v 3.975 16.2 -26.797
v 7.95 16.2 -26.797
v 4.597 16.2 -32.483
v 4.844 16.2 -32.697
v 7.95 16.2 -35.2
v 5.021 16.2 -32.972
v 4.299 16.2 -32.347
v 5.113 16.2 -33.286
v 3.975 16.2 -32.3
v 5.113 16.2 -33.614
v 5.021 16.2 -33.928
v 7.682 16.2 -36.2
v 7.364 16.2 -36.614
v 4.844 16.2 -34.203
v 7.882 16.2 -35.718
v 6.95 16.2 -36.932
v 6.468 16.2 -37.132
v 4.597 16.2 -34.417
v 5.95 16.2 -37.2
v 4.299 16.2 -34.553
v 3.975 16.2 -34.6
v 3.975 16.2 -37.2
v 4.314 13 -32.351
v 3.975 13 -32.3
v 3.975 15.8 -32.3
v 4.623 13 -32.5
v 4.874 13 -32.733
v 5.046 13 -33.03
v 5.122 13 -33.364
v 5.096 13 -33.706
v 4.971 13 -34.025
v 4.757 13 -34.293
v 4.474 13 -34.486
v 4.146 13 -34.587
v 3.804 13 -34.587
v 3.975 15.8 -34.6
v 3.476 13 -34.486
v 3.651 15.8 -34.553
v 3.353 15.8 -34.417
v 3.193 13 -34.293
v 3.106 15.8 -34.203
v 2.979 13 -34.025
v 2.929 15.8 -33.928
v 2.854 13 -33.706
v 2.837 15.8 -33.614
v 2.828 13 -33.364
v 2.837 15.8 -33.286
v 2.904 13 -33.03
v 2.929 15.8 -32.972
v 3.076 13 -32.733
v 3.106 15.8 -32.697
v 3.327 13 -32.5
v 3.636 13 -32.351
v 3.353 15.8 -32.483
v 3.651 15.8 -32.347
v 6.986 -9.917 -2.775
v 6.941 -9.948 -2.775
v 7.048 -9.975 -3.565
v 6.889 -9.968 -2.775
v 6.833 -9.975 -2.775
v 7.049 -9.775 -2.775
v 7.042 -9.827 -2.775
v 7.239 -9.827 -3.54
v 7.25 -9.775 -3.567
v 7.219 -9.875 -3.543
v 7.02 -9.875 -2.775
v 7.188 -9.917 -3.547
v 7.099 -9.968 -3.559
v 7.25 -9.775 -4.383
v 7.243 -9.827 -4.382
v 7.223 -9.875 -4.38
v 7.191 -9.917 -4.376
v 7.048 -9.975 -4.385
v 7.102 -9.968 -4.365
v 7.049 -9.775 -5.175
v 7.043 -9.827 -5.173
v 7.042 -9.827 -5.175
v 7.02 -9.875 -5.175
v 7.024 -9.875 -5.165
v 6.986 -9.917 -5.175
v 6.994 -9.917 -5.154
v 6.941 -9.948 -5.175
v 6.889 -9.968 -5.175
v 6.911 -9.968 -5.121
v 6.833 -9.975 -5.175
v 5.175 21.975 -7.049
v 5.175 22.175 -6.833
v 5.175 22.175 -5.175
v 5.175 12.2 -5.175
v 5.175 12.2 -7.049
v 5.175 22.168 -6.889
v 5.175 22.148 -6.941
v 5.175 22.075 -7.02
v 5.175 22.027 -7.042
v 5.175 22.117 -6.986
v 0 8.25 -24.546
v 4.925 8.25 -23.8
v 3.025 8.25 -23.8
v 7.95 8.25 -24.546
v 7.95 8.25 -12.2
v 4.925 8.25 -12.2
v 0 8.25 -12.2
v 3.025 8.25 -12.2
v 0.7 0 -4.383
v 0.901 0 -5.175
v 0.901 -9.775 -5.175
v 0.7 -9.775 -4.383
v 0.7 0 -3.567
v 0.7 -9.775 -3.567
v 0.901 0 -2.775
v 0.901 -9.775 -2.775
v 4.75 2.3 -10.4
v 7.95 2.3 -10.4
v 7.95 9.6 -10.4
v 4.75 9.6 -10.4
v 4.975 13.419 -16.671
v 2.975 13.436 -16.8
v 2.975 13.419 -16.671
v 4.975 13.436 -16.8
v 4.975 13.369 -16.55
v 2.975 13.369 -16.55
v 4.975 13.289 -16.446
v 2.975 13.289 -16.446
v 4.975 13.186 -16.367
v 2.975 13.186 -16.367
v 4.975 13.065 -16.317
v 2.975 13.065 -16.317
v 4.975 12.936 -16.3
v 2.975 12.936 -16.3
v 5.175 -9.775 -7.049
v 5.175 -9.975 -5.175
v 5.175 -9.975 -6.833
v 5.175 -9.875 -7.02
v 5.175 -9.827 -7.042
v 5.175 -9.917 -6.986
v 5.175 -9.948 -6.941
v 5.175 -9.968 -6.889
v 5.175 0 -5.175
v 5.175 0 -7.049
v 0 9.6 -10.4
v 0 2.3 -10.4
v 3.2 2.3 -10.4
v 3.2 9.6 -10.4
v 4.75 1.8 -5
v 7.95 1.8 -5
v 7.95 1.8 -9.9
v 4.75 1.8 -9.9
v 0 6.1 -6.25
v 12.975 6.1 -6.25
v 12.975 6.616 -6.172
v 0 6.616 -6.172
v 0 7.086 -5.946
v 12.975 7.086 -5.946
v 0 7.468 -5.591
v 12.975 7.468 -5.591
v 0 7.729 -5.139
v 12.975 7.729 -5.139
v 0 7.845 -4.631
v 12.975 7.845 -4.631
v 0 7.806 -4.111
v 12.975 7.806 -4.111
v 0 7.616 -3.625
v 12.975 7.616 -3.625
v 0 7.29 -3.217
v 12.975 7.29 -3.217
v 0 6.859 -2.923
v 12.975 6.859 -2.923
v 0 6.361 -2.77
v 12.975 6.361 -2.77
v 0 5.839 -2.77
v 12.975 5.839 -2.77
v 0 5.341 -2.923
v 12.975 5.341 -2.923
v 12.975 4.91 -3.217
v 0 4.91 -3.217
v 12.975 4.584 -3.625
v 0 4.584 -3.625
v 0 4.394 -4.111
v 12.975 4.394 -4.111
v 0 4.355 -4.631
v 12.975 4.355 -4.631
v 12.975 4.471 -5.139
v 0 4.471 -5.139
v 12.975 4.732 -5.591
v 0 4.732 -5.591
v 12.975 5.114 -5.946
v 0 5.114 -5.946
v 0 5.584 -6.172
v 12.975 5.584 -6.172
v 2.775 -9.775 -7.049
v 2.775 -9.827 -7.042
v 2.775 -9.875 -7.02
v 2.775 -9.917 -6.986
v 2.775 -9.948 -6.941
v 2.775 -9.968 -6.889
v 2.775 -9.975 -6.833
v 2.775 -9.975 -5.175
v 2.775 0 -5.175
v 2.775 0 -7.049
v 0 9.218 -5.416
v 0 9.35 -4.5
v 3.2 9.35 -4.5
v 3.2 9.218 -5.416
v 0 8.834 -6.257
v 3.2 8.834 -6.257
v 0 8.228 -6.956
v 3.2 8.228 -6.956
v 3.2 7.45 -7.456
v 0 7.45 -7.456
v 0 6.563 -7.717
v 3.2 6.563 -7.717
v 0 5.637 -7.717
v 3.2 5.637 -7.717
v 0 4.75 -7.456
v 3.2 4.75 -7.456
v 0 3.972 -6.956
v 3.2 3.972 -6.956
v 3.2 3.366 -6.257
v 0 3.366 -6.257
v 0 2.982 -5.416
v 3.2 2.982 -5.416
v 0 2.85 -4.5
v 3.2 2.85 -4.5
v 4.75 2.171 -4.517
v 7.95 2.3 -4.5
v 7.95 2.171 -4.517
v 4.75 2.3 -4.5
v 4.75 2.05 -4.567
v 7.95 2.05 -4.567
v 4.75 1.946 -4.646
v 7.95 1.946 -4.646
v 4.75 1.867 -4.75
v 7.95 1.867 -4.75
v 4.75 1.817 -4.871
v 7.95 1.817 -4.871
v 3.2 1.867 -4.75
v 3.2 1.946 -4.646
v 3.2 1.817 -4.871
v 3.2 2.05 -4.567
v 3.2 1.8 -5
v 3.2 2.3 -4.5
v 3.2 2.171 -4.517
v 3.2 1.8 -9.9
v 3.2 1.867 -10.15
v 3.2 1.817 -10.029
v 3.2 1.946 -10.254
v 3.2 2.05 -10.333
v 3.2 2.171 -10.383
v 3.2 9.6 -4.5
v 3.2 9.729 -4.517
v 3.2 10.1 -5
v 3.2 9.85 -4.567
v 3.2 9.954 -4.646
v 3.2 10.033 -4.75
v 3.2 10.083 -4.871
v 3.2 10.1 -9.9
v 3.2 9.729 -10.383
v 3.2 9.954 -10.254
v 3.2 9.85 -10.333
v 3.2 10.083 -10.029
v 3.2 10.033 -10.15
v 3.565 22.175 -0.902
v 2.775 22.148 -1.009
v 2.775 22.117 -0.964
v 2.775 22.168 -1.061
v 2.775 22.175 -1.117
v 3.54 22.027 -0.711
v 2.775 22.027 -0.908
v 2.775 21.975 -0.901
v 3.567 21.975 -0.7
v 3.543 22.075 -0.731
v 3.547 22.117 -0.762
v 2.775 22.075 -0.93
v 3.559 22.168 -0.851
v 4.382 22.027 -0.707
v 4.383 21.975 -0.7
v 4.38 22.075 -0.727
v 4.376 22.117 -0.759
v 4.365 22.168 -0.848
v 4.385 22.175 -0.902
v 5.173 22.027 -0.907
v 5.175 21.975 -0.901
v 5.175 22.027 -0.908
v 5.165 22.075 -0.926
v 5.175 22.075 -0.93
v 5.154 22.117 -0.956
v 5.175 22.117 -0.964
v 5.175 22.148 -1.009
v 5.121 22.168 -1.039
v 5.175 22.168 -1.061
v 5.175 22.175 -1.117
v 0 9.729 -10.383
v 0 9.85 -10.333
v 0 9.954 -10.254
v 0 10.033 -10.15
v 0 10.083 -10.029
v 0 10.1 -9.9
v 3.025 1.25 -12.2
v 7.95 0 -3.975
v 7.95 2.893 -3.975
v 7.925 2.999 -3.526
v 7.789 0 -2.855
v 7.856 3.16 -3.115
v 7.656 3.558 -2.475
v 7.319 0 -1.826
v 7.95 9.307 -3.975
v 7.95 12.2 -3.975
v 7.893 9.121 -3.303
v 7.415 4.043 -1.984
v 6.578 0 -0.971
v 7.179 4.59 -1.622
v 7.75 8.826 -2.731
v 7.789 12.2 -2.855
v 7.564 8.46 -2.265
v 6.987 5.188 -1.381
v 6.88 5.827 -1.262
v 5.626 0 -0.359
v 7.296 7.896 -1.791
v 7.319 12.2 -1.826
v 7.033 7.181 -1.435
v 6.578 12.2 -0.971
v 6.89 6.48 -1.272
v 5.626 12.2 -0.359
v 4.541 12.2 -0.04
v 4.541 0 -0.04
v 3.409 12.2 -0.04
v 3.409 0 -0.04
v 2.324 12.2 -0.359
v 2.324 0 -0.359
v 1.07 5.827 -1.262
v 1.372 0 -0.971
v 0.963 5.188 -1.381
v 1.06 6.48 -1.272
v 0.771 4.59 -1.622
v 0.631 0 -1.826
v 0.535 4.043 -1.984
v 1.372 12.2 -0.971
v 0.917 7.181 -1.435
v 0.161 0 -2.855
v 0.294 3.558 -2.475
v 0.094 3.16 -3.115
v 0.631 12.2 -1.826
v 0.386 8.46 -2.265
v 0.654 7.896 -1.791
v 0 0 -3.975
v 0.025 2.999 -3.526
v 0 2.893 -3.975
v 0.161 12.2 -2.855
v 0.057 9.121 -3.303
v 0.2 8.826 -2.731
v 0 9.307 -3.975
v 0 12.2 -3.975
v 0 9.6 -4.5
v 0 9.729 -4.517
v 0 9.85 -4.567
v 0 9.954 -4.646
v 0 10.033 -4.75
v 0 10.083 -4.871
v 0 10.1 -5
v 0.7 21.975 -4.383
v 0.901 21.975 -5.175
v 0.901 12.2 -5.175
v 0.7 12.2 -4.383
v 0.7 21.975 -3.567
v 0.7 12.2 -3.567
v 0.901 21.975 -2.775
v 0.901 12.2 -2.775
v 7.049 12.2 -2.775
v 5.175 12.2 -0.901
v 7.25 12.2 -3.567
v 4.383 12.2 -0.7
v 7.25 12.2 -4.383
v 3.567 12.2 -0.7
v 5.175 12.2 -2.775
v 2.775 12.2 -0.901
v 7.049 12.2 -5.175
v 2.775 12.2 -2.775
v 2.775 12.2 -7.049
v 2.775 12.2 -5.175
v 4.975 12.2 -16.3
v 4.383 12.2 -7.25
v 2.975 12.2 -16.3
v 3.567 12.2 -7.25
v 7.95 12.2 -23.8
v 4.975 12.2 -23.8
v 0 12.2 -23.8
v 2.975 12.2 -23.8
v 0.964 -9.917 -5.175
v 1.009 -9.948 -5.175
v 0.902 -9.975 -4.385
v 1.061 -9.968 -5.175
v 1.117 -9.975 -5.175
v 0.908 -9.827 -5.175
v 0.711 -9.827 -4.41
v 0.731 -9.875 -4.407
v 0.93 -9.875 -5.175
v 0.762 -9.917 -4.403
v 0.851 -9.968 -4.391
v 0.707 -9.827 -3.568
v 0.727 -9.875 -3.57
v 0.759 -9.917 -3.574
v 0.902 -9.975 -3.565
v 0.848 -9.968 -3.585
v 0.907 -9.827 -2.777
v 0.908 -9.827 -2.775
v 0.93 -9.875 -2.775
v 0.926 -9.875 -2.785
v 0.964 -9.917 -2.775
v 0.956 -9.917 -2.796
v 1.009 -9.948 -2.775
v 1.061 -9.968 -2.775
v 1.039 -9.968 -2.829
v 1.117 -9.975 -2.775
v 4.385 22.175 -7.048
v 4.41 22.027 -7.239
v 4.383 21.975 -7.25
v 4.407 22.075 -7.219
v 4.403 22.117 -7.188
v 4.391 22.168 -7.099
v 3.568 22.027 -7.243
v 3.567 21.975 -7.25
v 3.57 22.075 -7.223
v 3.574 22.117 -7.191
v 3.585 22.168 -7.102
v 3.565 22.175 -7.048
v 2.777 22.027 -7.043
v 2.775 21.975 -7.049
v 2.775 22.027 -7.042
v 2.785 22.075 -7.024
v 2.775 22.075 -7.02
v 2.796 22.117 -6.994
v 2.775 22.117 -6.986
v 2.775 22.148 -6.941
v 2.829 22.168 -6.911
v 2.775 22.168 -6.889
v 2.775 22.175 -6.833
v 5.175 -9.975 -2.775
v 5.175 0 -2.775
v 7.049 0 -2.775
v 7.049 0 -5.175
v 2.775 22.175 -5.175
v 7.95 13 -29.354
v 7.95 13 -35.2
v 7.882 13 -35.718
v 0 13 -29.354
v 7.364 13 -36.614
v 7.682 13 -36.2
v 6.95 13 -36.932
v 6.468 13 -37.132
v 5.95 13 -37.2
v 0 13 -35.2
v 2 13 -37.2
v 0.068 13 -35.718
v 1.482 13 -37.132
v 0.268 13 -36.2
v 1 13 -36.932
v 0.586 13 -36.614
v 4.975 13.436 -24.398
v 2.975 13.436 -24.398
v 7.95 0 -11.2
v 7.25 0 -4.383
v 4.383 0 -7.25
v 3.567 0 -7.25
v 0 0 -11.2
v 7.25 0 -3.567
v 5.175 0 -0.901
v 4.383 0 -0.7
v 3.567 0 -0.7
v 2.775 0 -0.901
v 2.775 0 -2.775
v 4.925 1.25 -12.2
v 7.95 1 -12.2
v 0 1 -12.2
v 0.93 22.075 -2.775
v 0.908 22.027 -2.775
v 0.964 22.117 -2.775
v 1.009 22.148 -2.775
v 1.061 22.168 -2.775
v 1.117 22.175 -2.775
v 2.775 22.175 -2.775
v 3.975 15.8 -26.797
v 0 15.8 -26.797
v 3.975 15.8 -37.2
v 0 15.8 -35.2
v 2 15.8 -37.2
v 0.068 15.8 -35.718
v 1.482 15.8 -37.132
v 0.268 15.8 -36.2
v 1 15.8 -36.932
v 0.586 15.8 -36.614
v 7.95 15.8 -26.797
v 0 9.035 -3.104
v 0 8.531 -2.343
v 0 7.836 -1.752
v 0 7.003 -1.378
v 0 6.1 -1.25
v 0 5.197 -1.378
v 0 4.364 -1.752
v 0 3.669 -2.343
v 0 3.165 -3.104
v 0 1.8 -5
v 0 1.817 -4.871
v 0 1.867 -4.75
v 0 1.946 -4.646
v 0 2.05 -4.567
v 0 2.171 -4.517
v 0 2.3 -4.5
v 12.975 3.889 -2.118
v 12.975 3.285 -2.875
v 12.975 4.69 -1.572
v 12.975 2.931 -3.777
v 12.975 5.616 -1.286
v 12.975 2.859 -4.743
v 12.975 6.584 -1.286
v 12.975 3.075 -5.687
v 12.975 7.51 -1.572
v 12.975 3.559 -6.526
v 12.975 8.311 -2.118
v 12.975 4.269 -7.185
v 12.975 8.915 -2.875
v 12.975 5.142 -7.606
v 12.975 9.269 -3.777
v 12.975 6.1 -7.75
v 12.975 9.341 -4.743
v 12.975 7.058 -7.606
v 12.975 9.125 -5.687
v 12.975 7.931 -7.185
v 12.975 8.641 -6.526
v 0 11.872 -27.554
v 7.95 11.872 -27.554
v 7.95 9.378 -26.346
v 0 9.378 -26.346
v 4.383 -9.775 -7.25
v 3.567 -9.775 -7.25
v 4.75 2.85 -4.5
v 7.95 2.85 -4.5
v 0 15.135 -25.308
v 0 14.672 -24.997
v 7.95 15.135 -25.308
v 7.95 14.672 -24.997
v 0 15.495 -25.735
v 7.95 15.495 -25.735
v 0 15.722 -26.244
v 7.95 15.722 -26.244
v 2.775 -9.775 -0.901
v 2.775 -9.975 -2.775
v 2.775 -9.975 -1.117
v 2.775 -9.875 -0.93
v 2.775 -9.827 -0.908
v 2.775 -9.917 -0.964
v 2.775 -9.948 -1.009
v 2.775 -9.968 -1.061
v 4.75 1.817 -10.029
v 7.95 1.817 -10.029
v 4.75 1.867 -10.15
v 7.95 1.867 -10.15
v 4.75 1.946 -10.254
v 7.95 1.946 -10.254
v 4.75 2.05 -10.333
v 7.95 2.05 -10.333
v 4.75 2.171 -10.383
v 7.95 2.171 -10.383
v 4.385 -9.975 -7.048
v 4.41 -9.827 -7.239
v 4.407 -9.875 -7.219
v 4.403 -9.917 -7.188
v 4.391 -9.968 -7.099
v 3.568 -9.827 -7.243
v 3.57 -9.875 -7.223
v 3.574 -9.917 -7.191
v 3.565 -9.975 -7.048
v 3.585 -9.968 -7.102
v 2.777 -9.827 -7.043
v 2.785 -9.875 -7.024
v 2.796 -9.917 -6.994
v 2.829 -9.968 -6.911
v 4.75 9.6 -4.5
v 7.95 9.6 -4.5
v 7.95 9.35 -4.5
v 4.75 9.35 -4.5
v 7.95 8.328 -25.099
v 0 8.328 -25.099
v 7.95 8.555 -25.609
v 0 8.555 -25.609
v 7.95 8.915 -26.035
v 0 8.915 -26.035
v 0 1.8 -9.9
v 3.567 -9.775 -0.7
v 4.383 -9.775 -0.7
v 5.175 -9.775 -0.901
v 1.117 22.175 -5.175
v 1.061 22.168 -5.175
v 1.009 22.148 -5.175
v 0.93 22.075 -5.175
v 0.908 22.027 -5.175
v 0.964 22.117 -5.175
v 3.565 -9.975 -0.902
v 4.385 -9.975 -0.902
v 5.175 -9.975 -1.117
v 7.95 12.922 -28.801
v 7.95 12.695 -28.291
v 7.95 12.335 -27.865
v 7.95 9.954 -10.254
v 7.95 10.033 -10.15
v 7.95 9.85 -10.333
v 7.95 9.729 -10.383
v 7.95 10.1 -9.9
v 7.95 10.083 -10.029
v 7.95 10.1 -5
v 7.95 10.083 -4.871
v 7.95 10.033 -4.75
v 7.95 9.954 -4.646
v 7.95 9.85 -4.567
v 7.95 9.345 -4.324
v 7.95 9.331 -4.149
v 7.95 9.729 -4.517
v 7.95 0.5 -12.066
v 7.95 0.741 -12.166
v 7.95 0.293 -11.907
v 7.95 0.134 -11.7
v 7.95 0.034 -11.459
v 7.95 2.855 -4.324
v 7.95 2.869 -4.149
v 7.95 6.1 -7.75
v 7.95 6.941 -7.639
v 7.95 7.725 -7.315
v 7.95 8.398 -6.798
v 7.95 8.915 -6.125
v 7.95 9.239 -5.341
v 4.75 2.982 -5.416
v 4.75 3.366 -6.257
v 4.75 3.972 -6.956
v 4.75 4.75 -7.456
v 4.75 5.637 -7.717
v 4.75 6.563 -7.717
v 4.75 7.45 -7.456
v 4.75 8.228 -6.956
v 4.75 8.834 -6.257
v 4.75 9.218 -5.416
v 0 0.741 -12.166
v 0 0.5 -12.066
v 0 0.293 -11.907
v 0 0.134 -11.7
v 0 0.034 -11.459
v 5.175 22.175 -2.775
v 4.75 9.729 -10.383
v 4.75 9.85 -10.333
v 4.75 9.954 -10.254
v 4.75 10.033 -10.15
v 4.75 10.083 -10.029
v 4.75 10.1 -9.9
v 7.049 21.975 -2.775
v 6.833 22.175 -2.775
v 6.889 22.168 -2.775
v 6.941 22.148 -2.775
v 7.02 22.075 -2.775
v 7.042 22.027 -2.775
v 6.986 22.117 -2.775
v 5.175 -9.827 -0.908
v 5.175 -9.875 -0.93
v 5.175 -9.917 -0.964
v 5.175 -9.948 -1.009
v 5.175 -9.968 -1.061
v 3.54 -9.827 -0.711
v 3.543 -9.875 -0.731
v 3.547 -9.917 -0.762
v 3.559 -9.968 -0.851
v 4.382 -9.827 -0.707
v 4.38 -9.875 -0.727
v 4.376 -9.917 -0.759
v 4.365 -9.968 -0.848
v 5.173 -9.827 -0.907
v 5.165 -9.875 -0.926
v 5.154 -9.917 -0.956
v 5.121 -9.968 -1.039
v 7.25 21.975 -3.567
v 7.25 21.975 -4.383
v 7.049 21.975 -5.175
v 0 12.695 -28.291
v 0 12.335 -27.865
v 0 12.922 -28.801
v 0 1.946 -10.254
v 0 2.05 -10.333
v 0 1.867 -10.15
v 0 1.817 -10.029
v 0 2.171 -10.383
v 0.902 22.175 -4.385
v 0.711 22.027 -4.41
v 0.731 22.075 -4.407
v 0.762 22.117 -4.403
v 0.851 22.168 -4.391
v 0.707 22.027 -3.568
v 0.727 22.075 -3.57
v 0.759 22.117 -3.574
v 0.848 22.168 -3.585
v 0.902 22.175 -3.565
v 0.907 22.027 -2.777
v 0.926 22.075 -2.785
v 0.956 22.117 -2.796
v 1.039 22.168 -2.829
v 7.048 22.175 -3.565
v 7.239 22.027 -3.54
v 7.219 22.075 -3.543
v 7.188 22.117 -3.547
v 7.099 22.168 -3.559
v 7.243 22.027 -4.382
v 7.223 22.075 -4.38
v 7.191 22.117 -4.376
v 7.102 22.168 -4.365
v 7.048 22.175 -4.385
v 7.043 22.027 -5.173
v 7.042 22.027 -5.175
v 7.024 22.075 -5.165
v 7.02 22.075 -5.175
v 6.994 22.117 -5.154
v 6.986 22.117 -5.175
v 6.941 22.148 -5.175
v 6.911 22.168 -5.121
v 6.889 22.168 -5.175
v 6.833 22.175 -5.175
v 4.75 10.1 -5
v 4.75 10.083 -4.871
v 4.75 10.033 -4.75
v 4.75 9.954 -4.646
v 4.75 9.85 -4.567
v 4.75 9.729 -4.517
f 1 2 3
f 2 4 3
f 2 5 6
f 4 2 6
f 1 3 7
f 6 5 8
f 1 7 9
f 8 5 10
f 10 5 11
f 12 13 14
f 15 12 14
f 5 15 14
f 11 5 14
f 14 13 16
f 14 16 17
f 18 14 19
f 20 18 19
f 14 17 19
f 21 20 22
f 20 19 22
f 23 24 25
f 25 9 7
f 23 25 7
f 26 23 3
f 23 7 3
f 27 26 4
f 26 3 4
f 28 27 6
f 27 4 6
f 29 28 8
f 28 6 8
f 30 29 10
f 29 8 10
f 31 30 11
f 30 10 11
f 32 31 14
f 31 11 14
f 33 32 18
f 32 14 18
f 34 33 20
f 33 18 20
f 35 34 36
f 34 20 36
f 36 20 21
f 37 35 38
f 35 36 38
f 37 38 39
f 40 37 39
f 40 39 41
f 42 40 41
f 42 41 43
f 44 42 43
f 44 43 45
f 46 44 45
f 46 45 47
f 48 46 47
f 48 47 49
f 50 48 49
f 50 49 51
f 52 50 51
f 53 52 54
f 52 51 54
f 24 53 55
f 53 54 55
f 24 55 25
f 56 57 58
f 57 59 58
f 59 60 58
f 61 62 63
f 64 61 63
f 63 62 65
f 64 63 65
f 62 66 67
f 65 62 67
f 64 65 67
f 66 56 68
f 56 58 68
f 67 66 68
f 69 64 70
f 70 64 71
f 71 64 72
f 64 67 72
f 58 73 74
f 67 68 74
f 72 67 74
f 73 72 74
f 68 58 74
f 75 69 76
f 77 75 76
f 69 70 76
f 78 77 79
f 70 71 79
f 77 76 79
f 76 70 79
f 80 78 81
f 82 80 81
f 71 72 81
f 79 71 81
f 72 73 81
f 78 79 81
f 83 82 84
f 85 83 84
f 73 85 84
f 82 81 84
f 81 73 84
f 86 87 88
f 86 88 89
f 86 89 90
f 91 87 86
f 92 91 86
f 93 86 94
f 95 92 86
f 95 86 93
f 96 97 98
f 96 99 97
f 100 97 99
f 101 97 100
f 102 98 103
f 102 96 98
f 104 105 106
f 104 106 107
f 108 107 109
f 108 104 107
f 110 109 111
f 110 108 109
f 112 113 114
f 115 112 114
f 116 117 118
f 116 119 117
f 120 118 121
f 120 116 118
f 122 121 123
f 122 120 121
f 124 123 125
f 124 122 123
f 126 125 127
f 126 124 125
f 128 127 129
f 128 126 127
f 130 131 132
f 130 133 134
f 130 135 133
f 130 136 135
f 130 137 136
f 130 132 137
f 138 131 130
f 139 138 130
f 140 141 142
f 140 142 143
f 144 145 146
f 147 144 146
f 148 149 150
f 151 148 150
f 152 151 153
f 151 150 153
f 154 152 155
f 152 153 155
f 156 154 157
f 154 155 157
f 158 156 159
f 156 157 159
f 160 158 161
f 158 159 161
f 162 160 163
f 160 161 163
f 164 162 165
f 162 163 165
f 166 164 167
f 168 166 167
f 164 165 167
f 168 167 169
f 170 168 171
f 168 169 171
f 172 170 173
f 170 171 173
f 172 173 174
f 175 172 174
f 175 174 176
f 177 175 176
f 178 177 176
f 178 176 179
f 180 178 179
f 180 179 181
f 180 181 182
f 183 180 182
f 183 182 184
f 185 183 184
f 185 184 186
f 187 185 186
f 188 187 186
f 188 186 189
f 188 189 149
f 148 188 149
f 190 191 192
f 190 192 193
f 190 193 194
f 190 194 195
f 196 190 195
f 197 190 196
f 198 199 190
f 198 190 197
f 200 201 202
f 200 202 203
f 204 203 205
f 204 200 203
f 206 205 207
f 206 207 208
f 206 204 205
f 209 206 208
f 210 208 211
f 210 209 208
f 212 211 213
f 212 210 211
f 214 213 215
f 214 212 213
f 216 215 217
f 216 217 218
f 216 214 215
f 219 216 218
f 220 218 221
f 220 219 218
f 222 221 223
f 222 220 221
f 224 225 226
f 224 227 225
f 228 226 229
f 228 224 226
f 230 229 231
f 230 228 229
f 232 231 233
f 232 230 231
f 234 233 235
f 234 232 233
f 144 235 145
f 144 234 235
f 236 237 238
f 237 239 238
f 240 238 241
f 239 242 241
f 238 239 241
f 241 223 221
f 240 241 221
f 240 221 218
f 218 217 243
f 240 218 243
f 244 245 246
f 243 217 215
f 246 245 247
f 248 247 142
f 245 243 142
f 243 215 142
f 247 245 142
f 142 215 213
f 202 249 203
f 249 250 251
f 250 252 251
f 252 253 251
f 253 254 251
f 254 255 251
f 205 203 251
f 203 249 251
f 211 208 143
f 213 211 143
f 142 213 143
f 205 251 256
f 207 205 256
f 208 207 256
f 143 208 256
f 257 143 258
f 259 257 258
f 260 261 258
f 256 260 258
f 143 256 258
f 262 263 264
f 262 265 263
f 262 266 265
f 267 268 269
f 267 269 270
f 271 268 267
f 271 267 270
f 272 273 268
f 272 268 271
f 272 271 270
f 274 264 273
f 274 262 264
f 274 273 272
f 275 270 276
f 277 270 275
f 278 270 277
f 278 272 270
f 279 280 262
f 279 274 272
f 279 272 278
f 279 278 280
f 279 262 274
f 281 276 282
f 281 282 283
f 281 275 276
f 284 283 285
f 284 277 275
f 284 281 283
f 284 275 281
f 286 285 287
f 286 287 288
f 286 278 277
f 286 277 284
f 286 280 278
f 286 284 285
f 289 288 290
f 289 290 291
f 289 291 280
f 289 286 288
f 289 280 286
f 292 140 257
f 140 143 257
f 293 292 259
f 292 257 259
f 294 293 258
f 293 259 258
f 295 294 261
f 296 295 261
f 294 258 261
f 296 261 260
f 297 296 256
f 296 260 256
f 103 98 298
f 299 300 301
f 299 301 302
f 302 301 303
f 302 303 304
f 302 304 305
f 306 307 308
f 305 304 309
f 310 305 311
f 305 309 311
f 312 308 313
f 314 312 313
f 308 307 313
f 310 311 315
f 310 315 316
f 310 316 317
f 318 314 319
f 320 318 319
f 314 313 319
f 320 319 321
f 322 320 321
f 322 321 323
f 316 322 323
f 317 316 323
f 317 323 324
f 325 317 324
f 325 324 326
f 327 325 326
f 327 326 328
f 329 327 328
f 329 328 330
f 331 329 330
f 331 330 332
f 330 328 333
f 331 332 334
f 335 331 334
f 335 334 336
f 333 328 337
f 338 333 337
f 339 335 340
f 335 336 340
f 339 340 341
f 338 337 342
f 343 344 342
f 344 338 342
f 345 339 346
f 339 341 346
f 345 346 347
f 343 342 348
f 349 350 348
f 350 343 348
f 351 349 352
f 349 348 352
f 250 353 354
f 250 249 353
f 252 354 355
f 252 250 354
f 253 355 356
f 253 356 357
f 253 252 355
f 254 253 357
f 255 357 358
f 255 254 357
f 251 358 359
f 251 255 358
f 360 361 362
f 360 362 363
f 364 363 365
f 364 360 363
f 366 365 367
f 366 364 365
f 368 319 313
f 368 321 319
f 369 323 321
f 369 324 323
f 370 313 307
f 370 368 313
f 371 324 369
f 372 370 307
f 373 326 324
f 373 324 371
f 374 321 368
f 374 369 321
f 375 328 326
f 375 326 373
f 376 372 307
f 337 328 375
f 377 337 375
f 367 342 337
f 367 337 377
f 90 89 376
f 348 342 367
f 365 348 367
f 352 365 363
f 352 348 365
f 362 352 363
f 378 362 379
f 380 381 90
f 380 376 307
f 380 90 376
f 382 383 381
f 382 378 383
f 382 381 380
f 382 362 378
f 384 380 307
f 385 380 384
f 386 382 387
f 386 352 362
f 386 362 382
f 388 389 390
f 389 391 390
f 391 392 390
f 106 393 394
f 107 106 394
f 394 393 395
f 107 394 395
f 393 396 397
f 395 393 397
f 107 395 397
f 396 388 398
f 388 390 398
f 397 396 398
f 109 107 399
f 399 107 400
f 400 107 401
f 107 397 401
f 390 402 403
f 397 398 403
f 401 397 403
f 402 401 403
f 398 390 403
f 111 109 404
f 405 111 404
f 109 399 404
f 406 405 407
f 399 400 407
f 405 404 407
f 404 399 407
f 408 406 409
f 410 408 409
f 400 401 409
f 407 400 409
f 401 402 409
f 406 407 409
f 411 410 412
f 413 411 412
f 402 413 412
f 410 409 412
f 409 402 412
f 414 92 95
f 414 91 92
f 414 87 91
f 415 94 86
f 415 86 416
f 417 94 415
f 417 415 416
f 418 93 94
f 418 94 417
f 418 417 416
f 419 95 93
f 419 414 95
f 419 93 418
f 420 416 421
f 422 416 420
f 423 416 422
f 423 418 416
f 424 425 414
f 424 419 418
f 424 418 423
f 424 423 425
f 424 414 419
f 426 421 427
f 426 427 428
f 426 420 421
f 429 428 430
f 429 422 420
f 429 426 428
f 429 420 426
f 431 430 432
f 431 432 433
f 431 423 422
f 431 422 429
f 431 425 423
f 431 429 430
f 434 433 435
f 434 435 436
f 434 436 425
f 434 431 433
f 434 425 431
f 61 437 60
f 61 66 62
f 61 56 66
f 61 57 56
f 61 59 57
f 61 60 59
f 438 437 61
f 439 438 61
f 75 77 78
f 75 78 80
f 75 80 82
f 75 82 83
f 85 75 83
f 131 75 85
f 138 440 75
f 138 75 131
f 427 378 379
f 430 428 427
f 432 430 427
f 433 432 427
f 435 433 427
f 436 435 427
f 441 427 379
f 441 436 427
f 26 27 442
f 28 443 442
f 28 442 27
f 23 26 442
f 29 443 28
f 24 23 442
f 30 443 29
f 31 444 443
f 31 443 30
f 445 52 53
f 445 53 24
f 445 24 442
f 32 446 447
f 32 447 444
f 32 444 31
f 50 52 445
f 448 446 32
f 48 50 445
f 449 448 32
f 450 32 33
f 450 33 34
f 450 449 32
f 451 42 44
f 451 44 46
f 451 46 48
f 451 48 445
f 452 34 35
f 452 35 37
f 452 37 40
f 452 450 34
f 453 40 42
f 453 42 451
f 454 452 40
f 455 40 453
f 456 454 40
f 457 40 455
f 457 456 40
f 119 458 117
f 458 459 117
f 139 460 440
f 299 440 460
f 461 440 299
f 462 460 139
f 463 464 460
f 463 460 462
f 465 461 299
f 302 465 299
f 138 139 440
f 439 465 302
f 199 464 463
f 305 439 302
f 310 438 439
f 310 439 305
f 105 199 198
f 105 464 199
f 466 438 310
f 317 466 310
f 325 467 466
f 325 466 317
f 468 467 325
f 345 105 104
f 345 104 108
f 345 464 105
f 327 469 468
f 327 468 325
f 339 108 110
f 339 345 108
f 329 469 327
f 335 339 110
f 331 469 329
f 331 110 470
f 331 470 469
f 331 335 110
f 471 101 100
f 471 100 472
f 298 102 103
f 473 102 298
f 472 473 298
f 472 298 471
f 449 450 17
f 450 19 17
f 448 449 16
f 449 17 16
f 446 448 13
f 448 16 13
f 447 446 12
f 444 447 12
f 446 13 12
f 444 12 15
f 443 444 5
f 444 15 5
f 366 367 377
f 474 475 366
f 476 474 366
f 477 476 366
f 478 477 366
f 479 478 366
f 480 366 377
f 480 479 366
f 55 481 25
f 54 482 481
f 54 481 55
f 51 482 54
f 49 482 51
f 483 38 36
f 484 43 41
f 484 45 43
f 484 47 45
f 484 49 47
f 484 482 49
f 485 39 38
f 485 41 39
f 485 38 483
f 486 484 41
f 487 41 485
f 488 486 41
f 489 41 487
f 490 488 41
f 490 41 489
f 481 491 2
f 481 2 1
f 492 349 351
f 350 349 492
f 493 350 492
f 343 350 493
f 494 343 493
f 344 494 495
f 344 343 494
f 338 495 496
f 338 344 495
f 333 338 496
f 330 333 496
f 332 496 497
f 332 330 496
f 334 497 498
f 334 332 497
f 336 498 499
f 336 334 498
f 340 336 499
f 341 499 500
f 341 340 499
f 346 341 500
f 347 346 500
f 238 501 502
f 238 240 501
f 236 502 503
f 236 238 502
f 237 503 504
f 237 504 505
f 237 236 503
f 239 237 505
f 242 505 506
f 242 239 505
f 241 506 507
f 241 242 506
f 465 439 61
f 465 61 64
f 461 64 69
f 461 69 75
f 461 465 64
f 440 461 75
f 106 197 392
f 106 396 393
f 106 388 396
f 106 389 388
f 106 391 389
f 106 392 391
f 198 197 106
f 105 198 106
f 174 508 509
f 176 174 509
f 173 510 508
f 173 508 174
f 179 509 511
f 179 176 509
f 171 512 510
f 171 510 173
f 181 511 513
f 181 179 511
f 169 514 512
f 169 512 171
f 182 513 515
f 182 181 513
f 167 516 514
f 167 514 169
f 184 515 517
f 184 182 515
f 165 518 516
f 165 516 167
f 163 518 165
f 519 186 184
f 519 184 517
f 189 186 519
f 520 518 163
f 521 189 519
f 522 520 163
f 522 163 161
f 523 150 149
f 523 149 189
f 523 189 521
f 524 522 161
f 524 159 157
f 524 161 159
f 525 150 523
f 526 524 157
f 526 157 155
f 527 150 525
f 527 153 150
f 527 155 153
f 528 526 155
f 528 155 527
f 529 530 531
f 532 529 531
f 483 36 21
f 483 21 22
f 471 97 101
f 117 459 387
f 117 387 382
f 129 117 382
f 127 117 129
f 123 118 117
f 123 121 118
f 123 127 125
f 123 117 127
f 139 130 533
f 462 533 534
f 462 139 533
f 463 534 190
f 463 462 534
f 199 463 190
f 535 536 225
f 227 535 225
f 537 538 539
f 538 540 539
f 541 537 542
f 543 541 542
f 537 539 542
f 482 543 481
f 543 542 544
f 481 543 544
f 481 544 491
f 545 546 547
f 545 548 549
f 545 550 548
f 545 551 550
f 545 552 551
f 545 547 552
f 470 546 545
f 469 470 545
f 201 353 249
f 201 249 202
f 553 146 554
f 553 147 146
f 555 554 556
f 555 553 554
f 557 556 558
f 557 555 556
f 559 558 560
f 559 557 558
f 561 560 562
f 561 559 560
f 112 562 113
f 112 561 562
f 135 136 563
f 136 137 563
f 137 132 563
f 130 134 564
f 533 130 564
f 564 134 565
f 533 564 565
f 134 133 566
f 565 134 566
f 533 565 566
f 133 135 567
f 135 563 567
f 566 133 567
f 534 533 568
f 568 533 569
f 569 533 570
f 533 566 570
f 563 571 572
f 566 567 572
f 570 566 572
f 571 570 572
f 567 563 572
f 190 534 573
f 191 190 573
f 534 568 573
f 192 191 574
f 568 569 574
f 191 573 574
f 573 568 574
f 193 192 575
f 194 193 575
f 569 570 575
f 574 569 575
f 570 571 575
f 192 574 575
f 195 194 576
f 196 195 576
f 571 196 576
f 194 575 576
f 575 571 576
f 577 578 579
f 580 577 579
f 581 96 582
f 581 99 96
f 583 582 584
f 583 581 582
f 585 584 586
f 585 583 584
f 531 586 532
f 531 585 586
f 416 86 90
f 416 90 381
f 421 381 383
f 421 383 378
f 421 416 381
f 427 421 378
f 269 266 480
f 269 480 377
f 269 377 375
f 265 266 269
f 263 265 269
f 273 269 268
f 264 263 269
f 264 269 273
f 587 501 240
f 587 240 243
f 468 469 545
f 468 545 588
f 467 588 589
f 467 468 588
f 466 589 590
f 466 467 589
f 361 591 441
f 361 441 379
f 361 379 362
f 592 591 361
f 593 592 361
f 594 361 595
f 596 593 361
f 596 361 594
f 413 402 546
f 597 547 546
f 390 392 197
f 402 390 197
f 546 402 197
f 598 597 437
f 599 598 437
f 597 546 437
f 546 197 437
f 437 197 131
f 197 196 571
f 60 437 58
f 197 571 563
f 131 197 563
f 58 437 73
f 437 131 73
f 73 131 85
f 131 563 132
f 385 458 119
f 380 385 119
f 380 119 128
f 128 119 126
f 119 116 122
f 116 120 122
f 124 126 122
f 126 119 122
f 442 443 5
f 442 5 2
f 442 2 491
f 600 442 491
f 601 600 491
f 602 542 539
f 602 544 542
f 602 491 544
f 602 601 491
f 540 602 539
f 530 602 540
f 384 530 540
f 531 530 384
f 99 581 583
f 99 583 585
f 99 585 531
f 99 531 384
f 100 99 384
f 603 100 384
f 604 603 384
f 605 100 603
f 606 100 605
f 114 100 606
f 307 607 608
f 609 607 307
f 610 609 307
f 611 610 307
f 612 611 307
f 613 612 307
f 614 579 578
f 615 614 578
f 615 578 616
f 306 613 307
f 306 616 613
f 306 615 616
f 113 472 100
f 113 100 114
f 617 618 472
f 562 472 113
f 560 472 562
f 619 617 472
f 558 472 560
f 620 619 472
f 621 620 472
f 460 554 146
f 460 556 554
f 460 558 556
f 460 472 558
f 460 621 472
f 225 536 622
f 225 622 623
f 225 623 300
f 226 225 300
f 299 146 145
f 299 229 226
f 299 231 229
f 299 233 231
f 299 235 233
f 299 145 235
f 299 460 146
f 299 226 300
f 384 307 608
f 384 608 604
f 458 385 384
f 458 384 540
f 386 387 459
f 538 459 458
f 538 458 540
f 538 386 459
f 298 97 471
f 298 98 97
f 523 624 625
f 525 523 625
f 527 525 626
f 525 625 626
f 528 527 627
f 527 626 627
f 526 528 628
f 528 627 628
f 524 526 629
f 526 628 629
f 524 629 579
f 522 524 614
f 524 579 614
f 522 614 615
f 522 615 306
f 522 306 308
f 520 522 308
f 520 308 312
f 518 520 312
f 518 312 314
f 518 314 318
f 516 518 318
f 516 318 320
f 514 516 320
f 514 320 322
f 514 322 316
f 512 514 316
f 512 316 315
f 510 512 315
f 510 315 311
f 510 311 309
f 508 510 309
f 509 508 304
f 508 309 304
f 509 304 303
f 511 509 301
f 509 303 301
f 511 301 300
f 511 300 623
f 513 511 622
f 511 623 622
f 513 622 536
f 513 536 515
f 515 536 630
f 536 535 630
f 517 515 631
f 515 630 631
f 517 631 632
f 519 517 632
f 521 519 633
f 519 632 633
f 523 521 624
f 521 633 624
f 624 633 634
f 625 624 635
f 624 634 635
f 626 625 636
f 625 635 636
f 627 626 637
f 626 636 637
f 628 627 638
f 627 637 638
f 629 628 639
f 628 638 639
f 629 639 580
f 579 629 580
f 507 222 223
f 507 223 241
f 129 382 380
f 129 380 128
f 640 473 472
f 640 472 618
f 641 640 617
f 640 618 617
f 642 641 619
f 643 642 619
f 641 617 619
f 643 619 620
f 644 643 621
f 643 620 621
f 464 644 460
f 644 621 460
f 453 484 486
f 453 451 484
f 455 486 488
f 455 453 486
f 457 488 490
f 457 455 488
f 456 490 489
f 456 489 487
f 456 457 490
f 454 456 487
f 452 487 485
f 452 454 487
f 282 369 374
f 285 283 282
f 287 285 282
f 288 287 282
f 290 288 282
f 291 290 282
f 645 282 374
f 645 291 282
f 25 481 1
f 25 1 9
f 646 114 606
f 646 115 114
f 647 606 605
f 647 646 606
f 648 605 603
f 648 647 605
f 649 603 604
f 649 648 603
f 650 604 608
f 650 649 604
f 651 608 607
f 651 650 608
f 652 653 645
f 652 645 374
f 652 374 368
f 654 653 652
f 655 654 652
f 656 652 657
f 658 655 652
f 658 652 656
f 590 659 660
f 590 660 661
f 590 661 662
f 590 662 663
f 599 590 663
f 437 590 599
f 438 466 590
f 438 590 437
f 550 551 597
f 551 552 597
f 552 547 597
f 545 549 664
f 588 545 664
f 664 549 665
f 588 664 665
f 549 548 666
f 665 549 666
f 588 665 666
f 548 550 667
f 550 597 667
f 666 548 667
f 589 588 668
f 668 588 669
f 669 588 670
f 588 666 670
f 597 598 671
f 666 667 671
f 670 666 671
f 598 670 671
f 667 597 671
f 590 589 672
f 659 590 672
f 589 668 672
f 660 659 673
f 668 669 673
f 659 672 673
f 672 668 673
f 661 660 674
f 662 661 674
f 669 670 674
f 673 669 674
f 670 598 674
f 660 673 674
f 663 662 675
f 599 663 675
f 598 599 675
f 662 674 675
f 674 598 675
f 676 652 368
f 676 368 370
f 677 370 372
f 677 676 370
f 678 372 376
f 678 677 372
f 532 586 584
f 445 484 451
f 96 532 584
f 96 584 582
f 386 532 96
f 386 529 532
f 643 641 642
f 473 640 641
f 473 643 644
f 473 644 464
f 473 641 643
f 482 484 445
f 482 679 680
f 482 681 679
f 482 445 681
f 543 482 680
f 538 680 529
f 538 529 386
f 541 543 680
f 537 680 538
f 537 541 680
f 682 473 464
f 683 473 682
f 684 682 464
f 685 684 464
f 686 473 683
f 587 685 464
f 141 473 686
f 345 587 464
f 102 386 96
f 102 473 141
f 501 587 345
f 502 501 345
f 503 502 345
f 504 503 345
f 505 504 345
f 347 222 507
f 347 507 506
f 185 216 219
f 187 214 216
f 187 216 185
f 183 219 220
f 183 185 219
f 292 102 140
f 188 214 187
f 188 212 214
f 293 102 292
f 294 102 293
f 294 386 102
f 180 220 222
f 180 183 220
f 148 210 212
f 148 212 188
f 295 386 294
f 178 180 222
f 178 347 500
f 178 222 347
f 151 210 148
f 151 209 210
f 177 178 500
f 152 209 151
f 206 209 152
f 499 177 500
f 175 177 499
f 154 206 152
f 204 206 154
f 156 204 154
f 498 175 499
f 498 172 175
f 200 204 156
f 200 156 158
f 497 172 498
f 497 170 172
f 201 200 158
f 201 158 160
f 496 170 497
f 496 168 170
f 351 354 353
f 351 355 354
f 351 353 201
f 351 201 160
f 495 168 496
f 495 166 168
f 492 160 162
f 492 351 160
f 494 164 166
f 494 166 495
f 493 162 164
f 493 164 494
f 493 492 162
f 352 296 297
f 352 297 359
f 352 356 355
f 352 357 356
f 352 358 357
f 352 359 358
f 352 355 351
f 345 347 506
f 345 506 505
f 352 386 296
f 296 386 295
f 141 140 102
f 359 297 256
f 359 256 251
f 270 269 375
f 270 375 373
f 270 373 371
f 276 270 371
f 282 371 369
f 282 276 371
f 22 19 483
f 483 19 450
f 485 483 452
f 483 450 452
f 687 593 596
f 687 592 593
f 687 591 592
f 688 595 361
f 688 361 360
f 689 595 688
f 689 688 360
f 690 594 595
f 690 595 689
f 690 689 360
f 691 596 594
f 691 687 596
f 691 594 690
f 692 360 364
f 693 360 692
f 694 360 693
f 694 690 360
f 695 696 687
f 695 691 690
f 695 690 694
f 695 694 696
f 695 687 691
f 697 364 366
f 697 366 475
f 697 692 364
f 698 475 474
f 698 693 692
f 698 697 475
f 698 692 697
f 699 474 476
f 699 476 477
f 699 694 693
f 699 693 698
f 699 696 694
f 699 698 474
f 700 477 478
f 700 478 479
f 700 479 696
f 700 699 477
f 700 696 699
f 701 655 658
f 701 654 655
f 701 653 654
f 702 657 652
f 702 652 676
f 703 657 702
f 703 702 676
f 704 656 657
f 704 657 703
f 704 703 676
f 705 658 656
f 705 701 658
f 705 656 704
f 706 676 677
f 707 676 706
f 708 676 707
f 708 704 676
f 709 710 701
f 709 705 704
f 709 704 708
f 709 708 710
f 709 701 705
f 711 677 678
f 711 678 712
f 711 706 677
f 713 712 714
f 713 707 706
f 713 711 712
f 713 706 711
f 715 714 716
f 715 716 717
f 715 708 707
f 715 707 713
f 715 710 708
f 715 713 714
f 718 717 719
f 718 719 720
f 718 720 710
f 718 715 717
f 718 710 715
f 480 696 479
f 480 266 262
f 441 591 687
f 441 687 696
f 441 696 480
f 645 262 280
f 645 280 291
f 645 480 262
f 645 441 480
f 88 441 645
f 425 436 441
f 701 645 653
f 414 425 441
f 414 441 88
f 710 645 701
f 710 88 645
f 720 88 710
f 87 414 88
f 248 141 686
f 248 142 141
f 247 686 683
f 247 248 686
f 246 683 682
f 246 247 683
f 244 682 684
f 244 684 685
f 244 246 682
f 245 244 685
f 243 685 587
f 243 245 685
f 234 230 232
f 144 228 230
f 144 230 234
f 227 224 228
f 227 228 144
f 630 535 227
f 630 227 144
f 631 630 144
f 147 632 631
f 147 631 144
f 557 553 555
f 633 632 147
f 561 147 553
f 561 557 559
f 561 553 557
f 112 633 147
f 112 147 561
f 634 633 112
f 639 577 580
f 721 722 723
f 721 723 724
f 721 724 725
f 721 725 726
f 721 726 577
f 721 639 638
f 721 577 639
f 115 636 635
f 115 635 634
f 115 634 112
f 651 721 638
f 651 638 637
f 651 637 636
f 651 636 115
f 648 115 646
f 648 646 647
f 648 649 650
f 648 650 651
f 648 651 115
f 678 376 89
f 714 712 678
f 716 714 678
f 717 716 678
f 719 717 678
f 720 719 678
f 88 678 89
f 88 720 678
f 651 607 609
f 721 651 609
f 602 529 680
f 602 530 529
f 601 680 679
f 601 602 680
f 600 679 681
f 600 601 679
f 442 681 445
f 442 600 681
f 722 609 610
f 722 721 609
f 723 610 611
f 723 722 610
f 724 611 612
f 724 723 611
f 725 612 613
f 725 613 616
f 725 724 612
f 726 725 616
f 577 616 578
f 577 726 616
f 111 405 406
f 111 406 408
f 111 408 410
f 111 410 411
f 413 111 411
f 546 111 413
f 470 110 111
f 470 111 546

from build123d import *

# Parameters (mm, degrees)
SALIENTE_EXTRUIR1_DEPTH             = 7.95
CORTAR_EXTRUIR1_DEPTH               = 42.190806013
SALIENTE_EXTRUIR2_DEPTH             = 0.95
REDONDEO1_R                         = 2
CROQUIS5_W                          = 8.098391508
CROQUIS5_H                          = 3
SALIENTE_EXTRUIR3_DEPTH             = 1
REDONDEO2_R                         = 0.5
REDONDEO3_R                         = 1
SALIENTE_EXTRUIR5_DEPTH             = 16.075
SALIENTE_EXTRUIR6_START             = -2.8
SALIENTE_EXTRUIR6_DEPTH             = 3.2
REDONDEO4_R                         = 2
CORTAR_EXTRUIR2_REACH               = 48.175
CROQUIS9_R                          = 1.15
REDONDEO5_R                         = 0.2
CROQUIS10_R                         = 3.25
SALIENTE_EXTRUIR7_DEPTH             = 9
SALIENTE_EXTRUIR7_DIRECTION_2_REACH = 45.49
CORTAR_EXTRUIR3_DEPTH               = 3.2
REDONDEO6_R                         = 0.5
REDONDEO6_OF_SIMETR_A4_R            = 0.5
CORTAR_EXTRUIR4_REACH               = 47.21
CROQUIS12_R                         = 1.75
CROQUIS13_W                         = 41.090174937
CROQUIS13_H                         = 34.933198672
CORTAR_EXTRUIR6_DEPTH               = 33


with BuildPart() as part:
    # Croquis1 → Saliente-Extruir1 (new body)
    with BuildSketch(Plane(origin=(0, 0, 0), x_dir=(0, 0, -1), z_dir=(1, 0, 0))):
        Polygon((0, 0), (0, 12.2), (23.8, 12.2), (25.543157895, 15.8), (37.2, 15.8), (37.2, 13), (28.1, 13), (25.8, 8.25), (12.2, 8.25), (12.2, 0), align=None)
    extrude(amount=SALIENTE_EXTRUIR1_DEPTH)

    # Croquis2 → Cortar-Extruir1 (cut, through all)
    with BuildSketch(Plane(origin=(0, 15.8, 0), x_dir=(1, 0, 0), z_dir=(0, 1, 0))):
        with BuildLine():
            Line((0, 3.975), (0, -1.023351504))
            Line((0, -1.023351504), (7.95, -1.023351504))
            Line((7.95, -1.023351504), (7.95, 3.975))
            ThreePointArc((7.95, 3.975), (3.975, 0), (0, 3.975))
        make_face()
    extrude(amount=-CORTAR_EXTRUIR1_DEPTH, mode=Mode.SUBTRACT)

    # Croquis3 → Saliente-Extruir2 (add, symmetric)
    with BuildSketch(Plane.ZY.offset(-3.975)):
        Polygon((-23.8, 8.25), (-12.2, 1.25), (-12.2, 8.25), align=None)
    extrude(amount=SALIENTE_EXTRUIR2_DEPTH, both=True)

    # Redondeo1
    redondeo1_edges = [part.edges().sort_by_distance(p)[0] for p in [
        (0, 14.4, -37.2),
        (3.975, 15.8, -25.543157895),
        (3.975, 13, -28.1),
        (3.975, 8.25, -25.8),
        (7.95, 14.4, -37.2),
    ]]
    fillet(redondeo1_edges, radius=REDONDEO1_R)

    # Croquis5 → Saliente-Extruir3 (add, symmetric)
    with BuildSketch(Plane.ZY.offset(-3.975)):
        with Locations((-20.349195754, 11.935808548)):
            Rectangle(CROQUIS5_W, CROQUIS5_H)
    extrude(amount=SALIENTE_EXTRUIR3_DEPTH, both=True)

    # Redondeo2
    redondeo2_edges = [part.edges().sort_by_distance(p)[0] for p in [
        (3.975, 13.435808548, -16.3),
    ]]
    fillet(redondeo2_edges, radius=REDONDEO2_R)

    # Redondeo3
    redondeo3_edges = [part.edges().sort_by_distance(p)[0] for p in [
        (3.975, 0, -12.2),
    ]]
    fillet(redondeo3_edges, radius=REDONDEO3_R)

    # Croquis6 → Saliente-Extruir5 (add, symmetric)
    with BuildSketch(Plane(origin=(0, 6.1, 0), x_dir=(1, 0, 0), z_dir=(0, 1, 0))):
        with BuildLine():
            Line((2.775, 7.04908523), (2.775, 5.175))
            Line((2.775, 5.175), (0.90091477, 5.175))
            ThreePointArc((0.90091477, 5.175), (0.675, 3.975), (0.90091477, 2.775))
            Line((0.90091477, 2.775), (2.775, 2.775))
            Line((2.775, 2.775), (2.775, 0.90091477))
            ThreePointArc((2.775, 0.90091477), (3.975, 0.675), (5.175, 0.90091477))
            Line((5.175, 0.90091477), (5.175, 2.775))
            Line((5.175, 2.775), (7.04908523, 2.775))
            ThreePointArc((7.04908523, 2.775), (7.275, 3.975), (7.04908523, 5.175))
            Line((7.04908523, 5.175), (5.175, 5.175))
            Line((5.175, 5.175), (5.175, 7.04908523))
            ThreePointArc((5.175, 7.04908523), (3.975, 7.275), (2.775, 7.04908523))
        make_face()
    extrude(amount=SALIENTE_EXTRUIR5_DEPTH, both=True)

    # Croquis8 → Saliente-Extruir6 (add)
    with BuildSketch(Plane(origin=(0, 15.8, 0), x_dir=(1, 0, 0), z_dir=(0, 1, 0)).offset(SALIENTE_EXTRUIR6_START)):
        Polygon((3.975, 37.2), (5.95, 37.2), (7.95, 37.2), (7.95, 26.796861802), (3.975, 26.796861802), align=None)
    extrude(amount=SALIENTE_EXTRUIR6_DEPTH)

    # Redondeo4
    redondeo4_edges = [part.edges().sort_by_distance(p)[0] for p in [
        (7.95, 14.6, -37.2),
    ]]
    fillet(redondeo4_edges, radius=REDONDEO4_R)

    # Croquis9 → Cortar-Extruir2 (cut, up to next)
    with BuildSketch(Plane(origin=(0, 16.2, 0), x_dir=(1, 0, 0), z_dir=(0, 1, 0)), mode=Mode.PRIVATE) as cortar_extruir2_sk1:
        with Locations(Location((3.975, 33.45, 0), (0, 0, 270))):
            Circle(CROQUIS9_R)
    cortar_extruir2_tool1 = extrude(cortar_extruir2_sk1.sketch, amount=-CORTAR_EXTRUIR2_REACH, mode=Mode.PRIVATE) & part.part
    add(cortar_extruir2_tool1.solids().sort_by_distance((3.975, 16.2, -33.45))[0], mode=Mode.SUBTRACT)

    # Redondeo5
    redondeo5_edges = [part.edges().sort_by_distance(p)[0] for p in [
        (3.975, -9.975, -7.275),
        (0.675, -9.975, -3.975),
        (3.975, -9.975, -0.675),
        (7.275, -9.975, -3.975),
        (3.975, 22.175, -7.275),
        (0.675, 22.175, -3.975),
        (3.975, 22.175, -0.675),
        (7.275, 22.175, -3.975),
    ]]
    fillet(redondeo5_edges, radius=REDONDEO5_R)

    # Croquis10 → Saliente-Extruir7 (add)
    with BuildSketch(Plane(origin=(3.975, 0, 0), x_dir=(0, 0, -1), z_dir=(1, 0, 0))):
        with Locations((4.5, 6.1)):
            Circle(CROQUIS10_R)
    extrude(amount=SALIENTE_EXTRUIR7_DEPTH)

    # Saliente-Extruir7 direction 2: up to this face of the body (flat: up to its plane)
    saliente_extruir7_direction_2_end = Plane(part.part.faces().sort_by_distance((0, 8.735177915, -15.168906587))[0])
    # Croquis10 → Saliente-Extruir7 direction 2 (add, up to the picked face)
    with BuildSketch(Plane(origin=(3.975, 0, 0), x_dir=(0, 0, -1), z_dir=(1, 0, 0)), mode=Mode.PRIVATE) as saliente_extruir7_direction_2_sk1:
        with Locations((4.5, 6.1)):
            Circle(CROQUIS10_R)
    saliente_extruir7_direction_2_tool1 = split(extrude(saliente_extruir7_direction_2_sk1.sketch, amount=-SALIENTE_EXTRUIR7_DIRECTION_2_REACH, mode=Mode.PRIVATE), bisect_by=saliente_extruir7_direction_2_end, keep=Keep.BOTH, mode=Mode.PRIVATE)
    add(saliente_extruir7_direction_2_tool1.solids().sort_by(Axis((3.975, 6.1, -4.5), (-1, 0, 0)))[0])

    # Croquis11 → Cortar-Extruir3 (cut)
    with BuildSketch(Plane.ZY):
        with BuildLine():
            Line((-10.4, 10.1), (-4.5, 10.1))
            Line((-4.5, 10.1), (-4.5, 9.35))
            ThreePointArc((-4.5, 9.35), (-7.75, 6.1), (-4.5, 2.85))
            Line((-4.5, 2.85), (-4.5, 1.8))
            Line((-4.5, 1.8), (-10.4, 1.8))
            Line((-10.4, 1.8), (-10.4, 10.1))
        make_face()
    cortar_extruir3 = extrude(amount=-CORTAR_EXTRUIR3_DEPTH, mode=Mode.SUBTRACT)

    # Redondeo6
    redondeo6_edges = [part.edges().sort_by_distance(p)[0] for p in [
        (1.6, 1.8, -10.4),
        (1.6, 10.1, -10.4),
        (1.6, 10.1, -4.5),
        (1.6, 1.8, -4.5),
    ]]
    fillet(redondeo6_edges, radius=REDONDEO6_R)

    # Simetría4: Cortar-Extruir3 across plane
    add(cortar_extruir3.mirror(Plane(origin=(3.975, 0, 0), x_dir=(0, 0, 1), z_dir=(1, 0, 0))), mode=Mode.SUBTRACT)

    # Redondeo6 of Simetría4
    redondeo6_of_simetr_a4_edges = [part.edges().sort_by_distance(p)[0] for p in [
        (6.35, 1.8, -10.4),
        (6.35, 10.1, -10.4),
        (6.35, 10.1, -4.5),
        (6.35, 1.8, -4.5),
    ]]
    fillet(redondeo6_of_simetr_a4_edges, radius=REDONDEO6_OF_SIMETR_A4_R)

    # Croquis12 → Cortar-Extruir4 (cut, up to next)
    with BuildSketch(Plane(origin=(12.975, 0, 0), x_dir=(0, 0, -1), z_dir=(1, 0, 0)), mode=Mode.PRIVATE) as cortar_extruir4_sk1:
        with Locations((4.5, 6.1)):
            Circle(CROQUIS12_R)
    cortar_extruir4_tool1 = extrude(cortar_extruir4_sk1.sketch, amount=-CORTAR_EXTRUIR4_REACH, mode=Mode.PRIVATE) & part.part
    add(cortar_extruir4_tool1.solids().sort_by_distance((12.975, 6.1, -4.5))[0], mode=Mode.SUBTRACT)


with BuildPart() as body_2:
    # Simetría6: mirrored copy
    add(part.part.mirror(Plane.ZY.offset(10)))

    # Croquis13 → Cortar-Extruir6 (cut)
    with BuildSketch(Plane(origin=(-10, 0, 0), x_dir=(0, 0, -1), z_dir=(1, 0, 0))):
        with Locations((19.577078705, 6.209166246)):
            Rectangle(CROQUIS13_W, CROQUIS13_H)
    extrude(amount=-CORTAR_EXTRUIR6_DEPTH, mode=Mode.SUBTRACT)


solid = part.part
